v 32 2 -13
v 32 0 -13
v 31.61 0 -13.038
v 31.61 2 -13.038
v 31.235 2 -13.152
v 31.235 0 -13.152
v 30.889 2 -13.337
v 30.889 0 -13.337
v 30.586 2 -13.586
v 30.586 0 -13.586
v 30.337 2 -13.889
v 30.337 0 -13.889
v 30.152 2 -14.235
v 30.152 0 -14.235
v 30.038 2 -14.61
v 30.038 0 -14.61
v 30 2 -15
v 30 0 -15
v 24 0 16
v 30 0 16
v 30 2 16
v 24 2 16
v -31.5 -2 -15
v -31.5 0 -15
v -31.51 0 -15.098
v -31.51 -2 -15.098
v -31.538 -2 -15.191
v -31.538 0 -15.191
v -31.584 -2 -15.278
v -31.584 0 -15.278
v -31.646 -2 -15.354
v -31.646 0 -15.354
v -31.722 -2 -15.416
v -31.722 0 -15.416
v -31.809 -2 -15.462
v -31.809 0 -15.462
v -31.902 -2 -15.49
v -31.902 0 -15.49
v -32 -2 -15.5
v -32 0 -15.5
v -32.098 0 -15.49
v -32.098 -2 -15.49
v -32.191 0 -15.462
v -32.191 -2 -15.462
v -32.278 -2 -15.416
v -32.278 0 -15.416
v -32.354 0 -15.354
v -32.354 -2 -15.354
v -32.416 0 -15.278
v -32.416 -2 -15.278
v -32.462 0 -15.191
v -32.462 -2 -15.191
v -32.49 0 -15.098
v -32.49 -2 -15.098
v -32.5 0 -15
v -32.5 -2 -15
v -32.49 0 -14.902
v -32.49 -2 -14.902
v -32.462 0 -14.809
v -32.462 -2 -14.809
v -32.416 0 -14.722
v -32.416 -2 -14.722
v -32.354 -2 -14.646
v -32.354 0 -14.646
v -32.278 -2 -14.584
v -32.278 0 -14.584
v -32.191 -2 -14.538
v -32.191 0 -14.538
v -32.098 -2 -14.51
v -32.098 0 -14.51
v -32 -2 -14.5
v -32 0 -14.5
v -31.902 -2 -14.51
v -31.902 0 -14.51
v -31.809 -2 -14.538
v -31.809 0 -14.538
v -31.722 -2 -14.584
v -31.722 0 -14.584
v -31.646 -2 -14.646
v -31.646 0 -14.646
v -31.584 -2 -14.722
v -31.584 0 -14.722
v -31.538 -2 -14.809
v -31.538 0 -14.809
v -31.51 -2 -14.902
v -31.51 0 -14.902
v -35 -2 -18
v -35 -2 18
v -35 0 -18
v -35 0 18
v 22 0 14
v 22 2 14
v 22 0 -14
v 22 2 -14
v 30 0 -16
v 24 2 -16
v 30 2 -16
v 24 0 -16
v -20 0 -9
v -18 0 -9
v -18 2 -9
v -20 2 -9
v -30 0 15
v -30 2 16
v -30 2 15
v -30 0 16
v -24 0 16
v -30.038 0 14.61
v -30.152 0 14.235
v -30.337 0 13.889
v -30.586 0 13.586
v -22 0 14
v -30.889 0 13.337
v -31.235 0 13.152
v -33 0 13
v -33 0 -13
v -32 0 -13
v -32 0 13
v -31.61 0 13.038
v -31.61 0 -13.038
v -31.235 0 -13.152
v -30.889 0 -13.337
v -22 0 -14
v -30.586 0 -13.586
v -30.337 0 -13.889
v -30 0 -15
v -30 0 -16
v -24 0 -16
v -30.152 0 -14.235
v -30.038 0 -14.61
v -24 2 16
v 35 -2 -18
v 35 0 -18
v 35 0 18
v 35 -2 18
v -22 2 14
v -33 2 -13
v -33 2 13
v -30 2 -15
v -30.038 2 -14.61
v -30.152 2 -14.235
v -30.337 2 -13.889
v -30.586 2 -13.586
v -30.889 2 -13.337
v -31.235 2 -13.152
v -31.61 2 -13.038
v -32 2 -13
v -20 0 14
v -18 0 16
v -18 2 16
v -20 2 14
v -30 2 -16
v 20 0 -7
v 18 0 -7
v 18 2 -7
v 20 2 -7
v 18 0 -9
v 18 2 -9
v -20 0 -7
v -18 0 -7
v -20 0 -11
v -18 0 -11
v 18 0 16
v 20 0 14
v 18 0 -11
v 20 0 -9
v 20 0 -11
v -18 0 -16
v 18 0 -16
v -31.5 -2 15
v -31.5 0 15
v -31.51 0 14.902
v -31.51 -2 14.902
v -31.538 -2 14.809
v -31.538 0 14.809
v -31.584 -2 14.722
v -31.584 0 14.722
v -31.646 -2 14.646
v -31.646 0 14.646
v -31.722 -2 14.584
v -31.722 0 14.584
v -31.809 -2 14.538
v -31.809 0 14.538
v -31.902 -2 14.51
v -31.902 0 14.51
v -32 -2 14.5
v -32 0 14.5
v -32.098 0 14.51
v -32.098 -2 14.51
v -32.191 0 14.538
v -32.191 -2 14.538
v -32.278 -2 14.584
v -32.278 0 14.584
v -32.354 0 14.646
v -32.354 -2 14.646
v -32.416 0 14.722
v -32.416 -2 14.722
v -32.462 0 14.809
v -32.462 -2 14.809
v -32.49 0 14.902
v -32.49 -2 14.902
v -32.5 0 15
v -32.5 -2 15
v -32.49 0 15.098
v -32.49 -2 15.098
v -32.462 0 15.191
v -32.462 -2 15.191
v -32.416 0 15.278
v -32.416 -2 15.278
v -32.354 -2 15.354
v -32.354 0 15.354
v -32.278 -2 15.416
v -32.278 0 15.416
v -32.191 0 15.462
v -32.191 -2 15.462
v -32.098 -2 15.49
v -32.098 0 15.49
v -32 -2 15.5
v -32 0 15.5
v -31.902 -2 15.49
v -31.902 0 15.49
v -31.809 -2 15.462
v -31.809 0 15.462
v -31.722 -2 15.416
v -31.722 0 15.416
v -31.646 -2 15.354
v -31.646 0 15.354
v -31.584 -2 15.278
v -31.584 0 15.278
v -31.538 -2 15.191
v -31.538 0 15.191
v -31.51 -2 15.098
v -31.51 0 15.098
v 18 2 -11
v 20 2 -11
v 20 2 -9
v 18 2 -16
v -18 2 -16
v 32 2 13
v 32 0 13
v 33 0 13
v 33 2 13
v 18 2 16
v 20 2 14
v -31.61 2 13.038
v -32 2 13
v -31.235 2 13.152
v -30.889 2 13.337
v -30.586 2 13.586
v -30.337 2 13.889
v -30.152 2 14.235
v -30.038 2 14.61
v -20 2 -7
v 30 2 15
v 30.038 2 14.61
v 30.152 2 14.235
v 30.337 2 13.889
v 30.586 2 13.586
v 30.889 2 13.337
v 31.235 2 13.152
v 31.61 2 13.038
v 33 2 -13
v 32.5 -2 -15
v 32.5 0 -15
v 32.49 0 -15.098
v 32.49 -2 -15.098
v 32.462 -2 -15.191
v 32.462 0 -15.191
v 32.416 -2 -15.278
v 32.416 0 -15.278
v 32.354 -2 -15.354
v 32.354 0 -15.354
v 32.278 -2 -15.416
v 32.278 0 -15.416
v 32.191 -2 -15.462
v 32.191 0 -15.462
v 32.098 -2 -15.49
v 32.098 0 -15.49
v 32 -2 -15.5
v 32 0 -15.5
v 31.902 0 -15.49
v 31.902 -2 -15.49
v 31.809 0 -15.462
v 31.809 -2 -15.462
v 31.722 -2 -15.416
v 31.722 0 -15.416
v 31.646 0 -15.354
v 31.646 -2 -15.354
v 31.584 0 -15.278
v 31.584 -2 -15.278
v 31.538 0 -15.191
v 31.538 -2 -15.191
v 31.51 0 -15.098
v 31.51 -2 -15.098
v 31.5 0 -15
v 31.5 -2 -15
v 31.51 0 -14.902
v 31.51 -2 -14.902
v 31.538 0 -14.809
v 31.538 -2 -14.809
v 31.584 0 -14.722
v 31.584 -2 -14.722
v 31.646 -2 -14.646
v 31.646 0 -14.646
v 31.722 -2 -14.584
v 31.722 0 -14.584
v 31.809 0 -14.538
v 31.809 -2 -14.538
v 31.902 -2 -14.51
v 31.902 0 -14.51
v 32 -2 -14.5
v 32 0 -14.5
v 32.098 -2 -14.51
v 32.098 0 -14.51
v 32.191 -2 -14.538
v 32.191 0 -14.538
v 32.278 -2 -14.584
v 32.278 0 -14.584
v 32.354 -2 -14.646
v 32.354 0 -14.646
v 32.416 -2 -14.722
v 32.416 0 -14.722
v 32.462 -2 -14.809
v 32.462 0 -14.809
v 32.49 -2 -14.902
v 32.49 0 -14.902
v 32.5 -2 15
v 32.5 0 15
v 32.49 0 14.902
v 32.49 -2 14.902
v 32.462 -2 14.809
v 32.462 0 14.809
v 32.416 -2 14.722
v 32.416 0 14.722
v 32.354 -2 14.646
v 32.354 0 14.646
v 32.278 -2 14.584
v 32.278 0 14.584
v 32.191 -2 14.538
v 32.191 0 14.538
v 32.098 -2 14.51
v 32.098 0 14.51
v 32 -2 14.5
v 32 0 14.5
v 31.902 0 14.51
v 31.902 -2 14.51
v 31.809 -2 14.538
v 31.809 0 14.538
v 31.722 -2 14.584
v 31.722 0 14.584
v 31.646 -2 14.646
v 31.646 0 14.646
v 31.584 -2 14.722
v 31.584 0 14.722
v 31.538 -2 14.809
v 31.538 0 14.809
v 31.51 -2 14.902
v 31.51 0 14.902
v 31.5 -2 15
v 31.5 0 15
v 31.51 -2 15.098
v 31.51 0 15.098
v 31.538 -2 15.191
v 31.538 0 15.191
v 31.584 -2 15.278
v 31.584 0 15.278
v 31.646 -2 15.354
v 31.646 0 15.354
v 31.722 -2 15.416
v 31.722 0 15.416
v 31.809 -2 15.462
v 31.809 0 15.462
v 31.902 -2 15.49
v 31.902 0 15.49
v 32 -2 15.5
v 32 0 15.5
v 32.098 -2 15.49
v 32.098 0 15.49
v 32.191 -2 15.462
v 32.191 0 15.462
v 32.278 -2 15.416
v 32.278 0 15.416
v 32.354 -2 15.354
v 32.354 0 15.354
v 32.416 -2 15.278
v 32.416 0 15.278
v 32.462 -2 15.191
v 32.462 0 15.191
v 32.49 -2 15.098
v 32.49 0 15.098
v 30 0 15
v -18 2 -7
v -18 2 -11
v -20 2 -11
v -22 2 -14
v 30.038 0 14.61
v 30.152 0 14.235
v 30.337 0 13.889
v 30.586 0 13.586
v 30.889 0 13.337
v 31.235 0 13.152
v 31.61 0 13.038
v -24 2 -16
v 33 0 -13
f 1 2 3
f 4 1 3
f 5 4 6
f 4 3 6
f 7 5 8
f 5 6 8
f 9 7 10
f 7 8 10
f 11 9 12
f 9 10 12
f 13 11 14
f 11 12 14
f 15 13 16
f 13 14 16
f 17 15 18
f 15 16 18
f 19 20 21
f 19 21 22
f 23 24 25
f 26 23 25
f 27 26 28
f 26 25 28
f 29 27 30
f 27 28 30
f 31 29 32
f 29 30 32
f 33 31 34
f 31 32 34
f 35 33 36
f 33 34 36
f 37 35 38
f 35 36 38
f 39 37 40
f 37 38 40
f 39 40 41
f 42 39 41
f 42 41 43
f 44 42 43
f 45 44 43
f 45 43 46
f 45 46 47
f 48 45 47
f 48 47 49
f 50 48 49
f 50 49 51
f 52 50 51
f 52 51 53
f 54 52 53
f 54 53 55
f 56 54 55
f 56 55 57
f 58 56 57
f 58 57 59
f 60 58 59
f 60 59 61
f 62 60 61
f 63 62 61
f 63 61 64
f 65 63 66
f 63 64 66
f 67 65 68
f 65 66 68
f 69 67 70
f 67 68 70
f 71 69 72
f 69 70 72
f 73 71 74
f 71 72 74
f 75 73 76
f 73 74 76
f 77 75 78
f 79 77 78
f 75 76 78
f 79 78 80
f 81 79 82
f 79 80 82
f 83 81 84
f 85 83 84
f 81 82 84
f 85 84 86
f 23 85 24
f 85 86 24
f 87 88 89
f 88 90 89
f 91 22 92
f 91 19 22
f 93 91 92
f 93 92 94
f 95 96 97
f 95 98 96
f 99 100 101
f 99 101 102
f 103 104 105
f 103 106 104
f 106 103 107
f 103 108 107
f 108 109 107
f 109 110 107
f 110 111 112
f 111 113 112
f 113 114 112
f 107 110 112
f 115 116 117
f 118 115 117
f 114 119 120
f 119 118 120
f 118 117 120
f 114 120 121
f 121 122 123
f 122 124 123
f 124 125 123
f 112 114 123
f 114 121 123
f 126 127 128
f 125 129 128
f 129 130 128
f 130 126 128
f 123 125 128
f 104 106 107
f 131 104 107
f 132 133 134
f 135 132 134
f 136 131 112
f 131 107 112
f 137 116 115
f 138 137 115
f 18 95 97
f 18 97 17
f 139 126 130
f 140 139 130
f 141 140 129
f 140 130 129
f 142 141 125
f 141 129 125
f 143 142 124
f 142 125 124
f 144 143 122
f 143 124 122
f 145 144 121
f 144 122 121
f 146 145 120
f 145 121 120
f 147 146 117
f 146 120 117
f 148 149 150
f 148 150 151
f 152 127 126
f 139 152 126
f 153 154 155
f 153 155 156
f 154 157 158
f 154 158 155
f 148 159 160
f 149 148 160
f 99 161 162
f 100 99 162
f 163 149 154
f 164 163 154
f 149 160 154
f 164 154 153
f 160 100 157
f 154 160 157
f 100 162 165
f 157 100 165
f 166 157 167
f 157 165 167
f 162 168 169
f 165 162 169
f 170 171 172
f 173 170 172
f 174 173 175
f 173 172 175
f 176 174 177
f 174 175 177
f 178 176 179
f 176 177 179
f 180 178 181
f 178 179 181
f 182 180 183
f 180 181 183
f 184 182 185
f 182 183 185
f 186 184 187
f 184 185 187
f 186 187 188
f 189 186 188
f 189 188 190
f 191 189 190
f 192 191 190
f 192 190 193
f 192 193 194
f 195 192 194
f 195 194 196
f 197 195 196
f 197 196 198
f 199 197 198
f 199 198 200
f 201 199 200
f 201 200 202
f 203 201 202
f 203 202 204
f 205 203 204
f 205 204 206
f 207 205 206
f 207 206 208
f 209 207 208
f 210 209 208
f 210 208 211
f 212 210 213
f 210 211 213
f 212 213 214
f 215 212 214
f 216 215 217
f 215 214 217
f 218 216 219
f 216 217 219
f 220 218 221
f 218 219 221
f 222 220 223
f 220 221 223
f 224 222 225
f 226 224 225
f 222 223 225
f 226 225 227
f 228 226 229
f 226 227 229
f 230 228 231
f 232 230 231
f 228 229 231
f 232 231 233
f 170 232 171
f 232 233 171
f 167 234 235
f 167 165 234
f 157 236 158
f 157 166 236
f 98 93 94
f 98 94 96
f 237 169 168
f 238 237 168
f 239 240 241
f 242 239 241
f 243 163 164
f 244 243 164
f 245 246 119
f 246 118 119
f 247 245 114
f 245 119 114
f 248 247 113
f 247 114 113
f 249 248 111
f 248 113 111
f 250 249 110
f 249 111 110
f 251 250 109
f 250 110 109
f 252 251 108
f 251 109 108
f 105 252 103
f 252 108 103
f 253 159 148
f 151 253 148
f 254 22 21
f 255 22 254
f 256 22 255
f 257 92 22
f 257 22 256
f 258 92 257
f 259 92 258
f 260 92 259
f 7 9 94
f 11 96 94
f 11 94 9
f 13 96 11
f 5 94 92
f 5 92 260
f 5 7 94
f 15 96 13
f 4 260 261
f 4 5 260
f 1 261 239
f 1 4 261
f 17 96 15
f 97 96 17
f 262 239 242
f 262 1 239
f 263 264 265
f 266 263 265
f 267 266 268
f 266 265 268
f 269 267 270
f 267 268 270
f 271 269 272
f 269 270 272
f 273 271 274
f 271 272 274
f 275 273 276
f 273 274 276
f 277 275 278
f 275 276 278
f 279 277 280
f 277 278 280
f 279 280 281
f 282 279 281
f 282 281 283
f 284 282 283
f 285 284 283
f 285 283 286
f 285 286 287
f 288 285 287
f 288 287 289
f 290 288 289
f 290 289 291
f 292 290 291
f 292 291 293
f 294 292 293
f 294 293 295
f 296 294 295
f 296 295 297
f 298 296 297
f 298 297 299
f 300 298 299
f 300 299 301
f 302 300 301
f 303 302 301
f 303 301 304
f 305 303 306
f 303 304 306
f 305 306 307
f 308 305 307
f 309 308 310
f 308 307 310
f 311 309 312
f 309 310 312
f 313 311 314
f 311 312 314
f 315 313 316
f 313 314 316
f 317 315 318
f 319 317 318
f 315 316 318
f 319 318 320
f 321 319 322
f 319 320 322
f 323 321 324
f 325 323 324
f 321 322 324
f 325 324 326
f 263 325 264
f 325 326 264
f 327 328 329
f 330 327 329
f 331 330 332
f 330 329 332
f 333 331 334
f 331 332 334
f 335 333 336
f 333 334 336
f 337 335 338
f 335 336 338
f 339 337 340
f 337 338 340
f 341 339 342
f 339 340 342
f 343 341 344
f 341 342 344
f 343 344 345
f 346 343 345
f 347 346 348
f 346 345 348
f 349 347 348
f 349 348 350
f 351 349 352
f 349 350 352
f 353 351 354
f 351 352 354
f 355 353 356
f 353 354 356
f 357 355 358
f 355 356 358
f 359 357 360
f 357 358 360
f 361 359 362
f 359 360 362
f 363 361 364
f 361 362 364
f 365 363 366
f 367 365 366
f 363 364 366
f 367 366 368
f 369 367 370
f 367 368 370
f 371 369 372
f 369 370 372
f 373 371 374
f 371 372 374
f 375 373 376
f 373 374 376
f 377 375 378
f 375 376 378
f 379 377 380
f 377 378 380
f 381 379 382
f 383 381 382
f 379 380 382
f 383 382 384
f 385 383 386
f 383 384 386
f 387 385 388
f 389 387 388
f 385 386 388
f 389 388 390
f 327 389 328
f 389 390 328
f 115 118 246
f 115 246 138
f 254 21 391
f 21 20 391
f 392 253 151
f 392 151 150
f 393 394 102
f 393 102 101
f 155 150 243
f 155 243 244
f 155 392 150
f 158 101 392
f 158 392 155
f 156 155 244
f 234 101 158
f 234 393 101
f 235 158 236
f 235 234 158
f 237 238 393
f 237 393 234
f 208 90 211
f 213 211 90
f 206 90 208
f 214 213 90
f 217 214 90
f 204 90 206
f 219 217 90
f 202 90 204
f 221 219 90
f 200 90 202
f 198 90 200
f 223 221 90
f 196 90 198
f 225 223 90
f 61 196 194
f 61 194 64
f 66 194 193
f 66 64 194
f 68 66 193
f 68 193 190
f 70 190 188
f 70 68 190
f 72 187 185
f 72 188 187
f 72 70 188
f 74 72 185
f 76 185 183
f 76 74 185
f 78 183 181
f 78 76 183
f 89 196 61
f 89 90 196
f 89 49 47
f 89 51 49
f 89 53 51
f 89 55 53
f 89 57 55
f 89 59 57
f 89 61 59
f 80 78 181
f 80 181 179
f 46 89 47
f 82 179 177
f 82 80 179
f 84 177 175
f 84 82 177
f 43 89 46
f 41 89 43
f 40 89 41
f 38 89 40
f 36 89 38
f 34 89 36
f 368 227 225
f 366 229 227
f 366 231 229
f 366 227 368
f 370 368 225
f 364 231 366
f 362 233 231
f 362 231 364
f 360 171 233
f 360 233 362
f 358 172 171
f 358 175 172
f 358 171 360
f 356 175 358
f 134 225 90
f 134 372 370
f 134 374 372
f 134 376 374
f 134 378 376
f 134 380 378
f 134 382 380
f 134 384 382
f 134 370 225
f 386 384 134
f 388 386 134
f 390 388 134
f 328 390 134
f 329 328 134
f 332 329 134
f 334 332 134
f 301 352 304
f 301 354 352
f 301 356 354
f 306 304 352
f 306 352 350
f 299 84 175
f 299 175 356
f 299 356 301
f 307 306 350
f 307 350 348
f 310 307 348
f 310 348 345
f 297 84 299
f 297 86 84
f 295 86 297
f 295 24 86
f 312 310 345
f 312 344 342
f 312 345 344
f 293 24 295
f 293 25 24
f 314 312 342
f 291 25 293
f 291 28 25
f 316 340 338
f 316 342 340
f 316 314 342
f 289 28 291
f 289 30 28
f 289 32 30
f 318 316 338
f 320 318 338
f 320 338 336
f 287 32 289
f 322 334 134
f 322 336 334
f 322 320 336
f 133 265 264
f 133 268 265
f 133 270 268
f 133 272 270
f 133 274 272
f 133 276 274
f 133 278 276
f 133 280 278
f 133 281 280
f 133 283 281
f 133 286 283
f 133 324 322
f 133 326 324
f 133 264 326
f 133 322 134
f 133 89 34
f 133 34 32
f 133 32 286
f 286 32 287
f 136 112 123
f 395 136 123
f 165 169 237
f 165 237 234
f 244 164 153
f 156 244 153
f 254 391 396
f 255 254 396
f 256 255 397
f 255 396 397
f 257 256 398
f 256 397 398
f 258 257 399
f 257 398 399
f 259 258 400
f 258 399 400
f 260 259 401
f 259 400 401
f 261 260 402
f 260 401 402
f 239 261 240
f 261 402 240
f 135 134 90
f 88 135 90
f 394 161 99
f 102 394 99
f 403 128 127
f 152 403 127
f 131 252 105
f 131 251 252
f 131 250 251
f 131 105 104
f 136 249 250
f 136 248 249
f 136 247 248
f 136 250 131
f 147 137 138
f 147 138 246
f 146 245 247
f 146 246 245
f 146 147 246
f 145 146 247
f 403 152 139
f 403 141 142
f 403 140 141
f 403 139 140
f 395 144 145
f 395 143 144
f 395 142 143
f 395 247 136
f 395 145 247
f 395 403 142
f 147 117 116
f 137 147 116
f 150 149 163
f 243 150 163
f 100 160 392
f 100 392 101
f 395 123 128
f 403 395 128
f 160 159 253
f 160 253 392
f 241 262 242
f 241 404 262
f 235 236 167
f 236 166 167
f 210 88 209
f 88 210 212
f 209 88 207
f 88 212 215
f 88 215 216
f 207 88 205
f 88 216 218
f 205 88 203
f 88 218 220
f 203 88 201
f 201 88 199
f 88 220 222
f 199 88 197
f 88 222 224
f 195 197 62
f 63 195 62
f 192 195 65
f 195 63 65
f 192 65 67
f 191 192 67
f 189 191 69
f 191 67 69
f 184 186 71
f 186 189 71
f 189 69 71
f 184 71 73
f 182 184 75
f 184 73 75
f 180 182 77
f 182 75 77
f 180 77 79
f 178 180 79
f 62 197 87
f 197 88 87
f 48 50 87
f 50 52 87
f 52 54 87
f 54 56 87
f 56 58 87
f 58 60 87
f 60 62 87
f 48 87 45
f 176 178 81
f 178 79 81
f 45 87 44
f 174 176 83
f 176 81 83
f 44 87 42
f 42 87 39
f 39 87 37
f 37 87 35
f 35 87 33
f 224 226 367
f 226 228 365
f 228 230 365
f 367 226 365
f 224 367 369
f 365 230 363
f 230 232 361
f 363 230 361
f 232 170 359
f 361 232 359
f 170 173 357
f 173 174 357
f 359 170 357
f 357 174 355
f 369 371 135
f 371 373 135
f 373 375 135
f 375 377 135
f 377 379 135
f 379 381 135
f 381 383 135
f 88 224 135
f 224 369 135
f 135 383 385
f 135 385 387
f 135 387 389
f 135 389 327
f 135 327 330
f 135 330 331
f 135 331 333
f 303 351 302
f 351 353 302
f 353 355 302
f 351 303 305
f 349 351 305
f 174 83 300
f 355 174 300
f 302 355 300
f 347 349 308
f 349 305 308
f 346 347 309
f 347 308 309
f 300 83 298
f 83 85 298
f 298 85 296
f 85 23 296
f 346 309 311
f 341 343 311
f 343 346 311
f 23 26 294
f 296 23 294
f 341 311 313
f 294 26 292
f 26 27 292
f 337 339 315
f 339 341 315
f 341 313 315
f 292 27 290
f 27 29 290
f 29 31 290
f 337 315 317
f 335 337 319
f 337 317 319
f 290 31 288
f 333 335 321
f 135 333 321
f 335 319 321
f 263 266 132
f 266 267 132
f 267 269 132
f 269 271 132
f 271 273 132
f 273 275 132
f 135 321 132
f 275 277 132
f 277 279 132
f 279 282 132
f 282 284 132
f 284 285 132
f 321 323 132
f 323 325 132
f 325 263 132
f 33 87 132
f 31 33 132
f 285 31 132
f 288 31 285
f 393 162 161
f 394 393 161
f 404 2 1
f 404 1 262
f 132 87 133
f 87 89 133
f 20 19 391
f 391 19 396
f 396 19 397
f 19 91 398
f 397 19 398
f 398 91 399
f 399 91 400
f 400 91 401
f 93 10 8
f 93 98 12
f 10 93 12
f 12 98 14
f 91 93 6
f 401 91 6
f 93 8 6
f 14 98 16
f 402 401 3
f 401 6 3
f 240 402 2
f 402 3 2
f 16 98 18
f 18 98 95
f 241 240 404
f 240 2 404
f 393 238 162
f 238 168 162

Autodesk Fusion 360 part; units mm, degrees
sketch "Esquisse1" plane through (0, 0, 0) normal (0, 1, 0) x (1, 0, 0)
  line L0 (-35, 18) -> (35, 18)
  line L1 (35, 18) -> (35, -18)
  line L2 (35, -18) -> (-35, -18)
  line L3 (-35, -18) -> (-35, 18)
  line L4 (-33, -16) -> (-22, -16)
  line L5 (-22, -16) -> (-22, 16)
  line L6 (-22, 16) -> (-33, 16)
  line L7 (-33, 16) -> (-33, -16)
  line L8 (33, -16) -> (22, -16)
  line L9 (22, -16) -> (22, 16)
  line L10 (22, 16) -> (33, 16)
  line L11 (33, 16) -> (33, -16)
  line L12 (-20, -16) -> (20, -16)
  line L13 (20, -16) -> (20, 16)
  line L14 (20, 16) -> (-20, 16)
  line L15 (-20, 16) -> (-20, -16)
  line L16 (32, -13) -> (33, -13)
  line L17 (33, -13) -> (33, -16)
  line L18 (33, -16) -> (30, -16)
  line L19 (30, -16) -> (30, -15)
  line L20 (32, 13) -> (33, 13)
  line L21 (33, 13) -> (33, 16)
  line L22 (33, 16) -> (30, 16)
  line L23 (30, 16) -> (30, 15)
  circle A0 centre (26, -12) radius 3
  arc A1 (32, -13) -> (30, -15) centre (32, -15) ccw
  arc A2 (30, 15) -> (32, 13) centre (32, 15) ccw
  line L24 (24, -16) -> (22, -14)
  line L25 (22, 14) -> (24, 16)
  line L26 (18, -16) -> (20, -14)
  line L27 (-18, -16) -> (-20, -14)
  line L28 (-22, 14) -> (-24, 16)
  line L29 (-24, -16) -> (-22, -14)
  line L30 (-33, -16) -> (-30, -16)
  line L31 (-30, -16) -> (-30, -15)
  line L32 (-32, -13) -> (-33, -13)
  line L33 (-33, -13) -> (-33, -16)
  line L34 (-32, 13) -> (-33, 13)
  line L35 (-33, 13) -> (-33, 16)
  line L36 (-33, 16) -> (-30, 16)
  line L37 (-30, 16) -> (-30, 15)
  arc A3 (-30, -15) -> (-32, -13) centre (-32, -15) ccw
  arc A4 (-32, 13) -> (-30, 15) centre (-32, 15) ccw
  circle A5 centre (-26, -12) radius 3
  line L38 (-20, 16) -> (-18, 16)
  line L39 (-18, 16) -> (-18, 11)
  line L40 (-18, 11) -> (-20, 11)
  line L41 (-20, 11) -> (-20, 16)
  line L42 (18, 11) -> (20, 11)
  line L43 (20, 11) -> (20, 16)
  line L44 (20, 16) -> (18, 16)
  line L45 (18, 16) -> (18, 11)
  line L46 (20, 9) -> (18, 9)
  line L47 (18, 9) -> (18, 7)
  line L48 (18, 7) -> (20, 7)
  line L49 (20, 7) -> (20, 9)
  line L50 (-18, 9) -> (-20, 9)
  line L51 (-20, 9) -> (-20, 7)
  line L52 (-20, 7) -> (-18, 7)
  line L53 (-18, 7) -> (-18, 9)
  line L54 (-17.5, 6.5) -> (-8, 6.5)
  line L55 (-8, 6.5) -> (-8, 2)
  line L56 (-8, 2) -> (-17.5, 2)
  line L57 (-17.5, 2) -> (-17.5, 6.5)
  line L58 (20, 5) -> (20, 6.5)
  circle A6 centre (14.9, 4.5) radius 1.5
  circle A7 centre (8.6, 4.5) radius 1.5
  circle A8 centre (2.3, 4.5) radius 1.5
  circle A9 centre (-32, -15) radius 0.5
  circle A10 centre (-32, 15) radius 0.5
  circle A11 centre (32, -15) radius 0.5
  circle A12 centre (32, 15) radius 0.5
  circle A13 centre (-26, -12) radius 0.5
  circle A14 centre (26, -12) radius 0.5
extrude "Extrusion8" add sketch "Esquisse1" along normal blind 2 contours L4 L5 L6 L7 L28 L29 L31 L32 L34 L37 A3 A4 | L8 L9 L10 L11 L16 L19 L20 L23 A1 A2 L24 L25 | L12 L13 L14 L15 L26 L27 L39 L40 L42 L45 L46 L47 L48 L50 L52 L53 L58 | A0 | A5 | L54 L55 L56 L57 | A6 | A7 | A8 | A13 | A14 makes body 1 at (-25.0564, 0, 4.3936) makes body 2 at (-6, 0, 8.3333) makes body 3 at (25.0564, 0, -4.3936)
extrude "Extrusion9" add sketch "Esquisse1" against normal blind 2 separate body contours L0 L1 L2 L3 | L4 L7 L30 L31 L32 L33 A3 | L4 L5 L6 L7 L28 L29 L31 L32 L34 L37 A3 A4 | L4 L5 L29 | L6 L7 L34 L35 L36 L37 A4 | L5 L6 L28 | L8 L11 L16 L17 L18 L19 A1 | L8 L9 L10 L11 L16 L19 L20 L23 A1 A2 L24 L25 | L8 L9 L24 | L10 L11 L20 L21 L22 L23 A2 | L9 L10 L25 | L12 L15 L27 | L12 L13 L14 L15 L26 L27 L39 L40 L42 L45 L46 L47 L48 L50 L52 L53 L58 | L12 L13 L26 | L15 L50 L51 L52 L53 | L14 L15 L38 L39 L40 L41 | L13 L46 L47 L48 L49 | L13 L14 L42 L43 L44 L45 | A0 | A5 | L54 L55 L56 L57 | A6 | A7 | A8 | A13 | A14 makes body 4
